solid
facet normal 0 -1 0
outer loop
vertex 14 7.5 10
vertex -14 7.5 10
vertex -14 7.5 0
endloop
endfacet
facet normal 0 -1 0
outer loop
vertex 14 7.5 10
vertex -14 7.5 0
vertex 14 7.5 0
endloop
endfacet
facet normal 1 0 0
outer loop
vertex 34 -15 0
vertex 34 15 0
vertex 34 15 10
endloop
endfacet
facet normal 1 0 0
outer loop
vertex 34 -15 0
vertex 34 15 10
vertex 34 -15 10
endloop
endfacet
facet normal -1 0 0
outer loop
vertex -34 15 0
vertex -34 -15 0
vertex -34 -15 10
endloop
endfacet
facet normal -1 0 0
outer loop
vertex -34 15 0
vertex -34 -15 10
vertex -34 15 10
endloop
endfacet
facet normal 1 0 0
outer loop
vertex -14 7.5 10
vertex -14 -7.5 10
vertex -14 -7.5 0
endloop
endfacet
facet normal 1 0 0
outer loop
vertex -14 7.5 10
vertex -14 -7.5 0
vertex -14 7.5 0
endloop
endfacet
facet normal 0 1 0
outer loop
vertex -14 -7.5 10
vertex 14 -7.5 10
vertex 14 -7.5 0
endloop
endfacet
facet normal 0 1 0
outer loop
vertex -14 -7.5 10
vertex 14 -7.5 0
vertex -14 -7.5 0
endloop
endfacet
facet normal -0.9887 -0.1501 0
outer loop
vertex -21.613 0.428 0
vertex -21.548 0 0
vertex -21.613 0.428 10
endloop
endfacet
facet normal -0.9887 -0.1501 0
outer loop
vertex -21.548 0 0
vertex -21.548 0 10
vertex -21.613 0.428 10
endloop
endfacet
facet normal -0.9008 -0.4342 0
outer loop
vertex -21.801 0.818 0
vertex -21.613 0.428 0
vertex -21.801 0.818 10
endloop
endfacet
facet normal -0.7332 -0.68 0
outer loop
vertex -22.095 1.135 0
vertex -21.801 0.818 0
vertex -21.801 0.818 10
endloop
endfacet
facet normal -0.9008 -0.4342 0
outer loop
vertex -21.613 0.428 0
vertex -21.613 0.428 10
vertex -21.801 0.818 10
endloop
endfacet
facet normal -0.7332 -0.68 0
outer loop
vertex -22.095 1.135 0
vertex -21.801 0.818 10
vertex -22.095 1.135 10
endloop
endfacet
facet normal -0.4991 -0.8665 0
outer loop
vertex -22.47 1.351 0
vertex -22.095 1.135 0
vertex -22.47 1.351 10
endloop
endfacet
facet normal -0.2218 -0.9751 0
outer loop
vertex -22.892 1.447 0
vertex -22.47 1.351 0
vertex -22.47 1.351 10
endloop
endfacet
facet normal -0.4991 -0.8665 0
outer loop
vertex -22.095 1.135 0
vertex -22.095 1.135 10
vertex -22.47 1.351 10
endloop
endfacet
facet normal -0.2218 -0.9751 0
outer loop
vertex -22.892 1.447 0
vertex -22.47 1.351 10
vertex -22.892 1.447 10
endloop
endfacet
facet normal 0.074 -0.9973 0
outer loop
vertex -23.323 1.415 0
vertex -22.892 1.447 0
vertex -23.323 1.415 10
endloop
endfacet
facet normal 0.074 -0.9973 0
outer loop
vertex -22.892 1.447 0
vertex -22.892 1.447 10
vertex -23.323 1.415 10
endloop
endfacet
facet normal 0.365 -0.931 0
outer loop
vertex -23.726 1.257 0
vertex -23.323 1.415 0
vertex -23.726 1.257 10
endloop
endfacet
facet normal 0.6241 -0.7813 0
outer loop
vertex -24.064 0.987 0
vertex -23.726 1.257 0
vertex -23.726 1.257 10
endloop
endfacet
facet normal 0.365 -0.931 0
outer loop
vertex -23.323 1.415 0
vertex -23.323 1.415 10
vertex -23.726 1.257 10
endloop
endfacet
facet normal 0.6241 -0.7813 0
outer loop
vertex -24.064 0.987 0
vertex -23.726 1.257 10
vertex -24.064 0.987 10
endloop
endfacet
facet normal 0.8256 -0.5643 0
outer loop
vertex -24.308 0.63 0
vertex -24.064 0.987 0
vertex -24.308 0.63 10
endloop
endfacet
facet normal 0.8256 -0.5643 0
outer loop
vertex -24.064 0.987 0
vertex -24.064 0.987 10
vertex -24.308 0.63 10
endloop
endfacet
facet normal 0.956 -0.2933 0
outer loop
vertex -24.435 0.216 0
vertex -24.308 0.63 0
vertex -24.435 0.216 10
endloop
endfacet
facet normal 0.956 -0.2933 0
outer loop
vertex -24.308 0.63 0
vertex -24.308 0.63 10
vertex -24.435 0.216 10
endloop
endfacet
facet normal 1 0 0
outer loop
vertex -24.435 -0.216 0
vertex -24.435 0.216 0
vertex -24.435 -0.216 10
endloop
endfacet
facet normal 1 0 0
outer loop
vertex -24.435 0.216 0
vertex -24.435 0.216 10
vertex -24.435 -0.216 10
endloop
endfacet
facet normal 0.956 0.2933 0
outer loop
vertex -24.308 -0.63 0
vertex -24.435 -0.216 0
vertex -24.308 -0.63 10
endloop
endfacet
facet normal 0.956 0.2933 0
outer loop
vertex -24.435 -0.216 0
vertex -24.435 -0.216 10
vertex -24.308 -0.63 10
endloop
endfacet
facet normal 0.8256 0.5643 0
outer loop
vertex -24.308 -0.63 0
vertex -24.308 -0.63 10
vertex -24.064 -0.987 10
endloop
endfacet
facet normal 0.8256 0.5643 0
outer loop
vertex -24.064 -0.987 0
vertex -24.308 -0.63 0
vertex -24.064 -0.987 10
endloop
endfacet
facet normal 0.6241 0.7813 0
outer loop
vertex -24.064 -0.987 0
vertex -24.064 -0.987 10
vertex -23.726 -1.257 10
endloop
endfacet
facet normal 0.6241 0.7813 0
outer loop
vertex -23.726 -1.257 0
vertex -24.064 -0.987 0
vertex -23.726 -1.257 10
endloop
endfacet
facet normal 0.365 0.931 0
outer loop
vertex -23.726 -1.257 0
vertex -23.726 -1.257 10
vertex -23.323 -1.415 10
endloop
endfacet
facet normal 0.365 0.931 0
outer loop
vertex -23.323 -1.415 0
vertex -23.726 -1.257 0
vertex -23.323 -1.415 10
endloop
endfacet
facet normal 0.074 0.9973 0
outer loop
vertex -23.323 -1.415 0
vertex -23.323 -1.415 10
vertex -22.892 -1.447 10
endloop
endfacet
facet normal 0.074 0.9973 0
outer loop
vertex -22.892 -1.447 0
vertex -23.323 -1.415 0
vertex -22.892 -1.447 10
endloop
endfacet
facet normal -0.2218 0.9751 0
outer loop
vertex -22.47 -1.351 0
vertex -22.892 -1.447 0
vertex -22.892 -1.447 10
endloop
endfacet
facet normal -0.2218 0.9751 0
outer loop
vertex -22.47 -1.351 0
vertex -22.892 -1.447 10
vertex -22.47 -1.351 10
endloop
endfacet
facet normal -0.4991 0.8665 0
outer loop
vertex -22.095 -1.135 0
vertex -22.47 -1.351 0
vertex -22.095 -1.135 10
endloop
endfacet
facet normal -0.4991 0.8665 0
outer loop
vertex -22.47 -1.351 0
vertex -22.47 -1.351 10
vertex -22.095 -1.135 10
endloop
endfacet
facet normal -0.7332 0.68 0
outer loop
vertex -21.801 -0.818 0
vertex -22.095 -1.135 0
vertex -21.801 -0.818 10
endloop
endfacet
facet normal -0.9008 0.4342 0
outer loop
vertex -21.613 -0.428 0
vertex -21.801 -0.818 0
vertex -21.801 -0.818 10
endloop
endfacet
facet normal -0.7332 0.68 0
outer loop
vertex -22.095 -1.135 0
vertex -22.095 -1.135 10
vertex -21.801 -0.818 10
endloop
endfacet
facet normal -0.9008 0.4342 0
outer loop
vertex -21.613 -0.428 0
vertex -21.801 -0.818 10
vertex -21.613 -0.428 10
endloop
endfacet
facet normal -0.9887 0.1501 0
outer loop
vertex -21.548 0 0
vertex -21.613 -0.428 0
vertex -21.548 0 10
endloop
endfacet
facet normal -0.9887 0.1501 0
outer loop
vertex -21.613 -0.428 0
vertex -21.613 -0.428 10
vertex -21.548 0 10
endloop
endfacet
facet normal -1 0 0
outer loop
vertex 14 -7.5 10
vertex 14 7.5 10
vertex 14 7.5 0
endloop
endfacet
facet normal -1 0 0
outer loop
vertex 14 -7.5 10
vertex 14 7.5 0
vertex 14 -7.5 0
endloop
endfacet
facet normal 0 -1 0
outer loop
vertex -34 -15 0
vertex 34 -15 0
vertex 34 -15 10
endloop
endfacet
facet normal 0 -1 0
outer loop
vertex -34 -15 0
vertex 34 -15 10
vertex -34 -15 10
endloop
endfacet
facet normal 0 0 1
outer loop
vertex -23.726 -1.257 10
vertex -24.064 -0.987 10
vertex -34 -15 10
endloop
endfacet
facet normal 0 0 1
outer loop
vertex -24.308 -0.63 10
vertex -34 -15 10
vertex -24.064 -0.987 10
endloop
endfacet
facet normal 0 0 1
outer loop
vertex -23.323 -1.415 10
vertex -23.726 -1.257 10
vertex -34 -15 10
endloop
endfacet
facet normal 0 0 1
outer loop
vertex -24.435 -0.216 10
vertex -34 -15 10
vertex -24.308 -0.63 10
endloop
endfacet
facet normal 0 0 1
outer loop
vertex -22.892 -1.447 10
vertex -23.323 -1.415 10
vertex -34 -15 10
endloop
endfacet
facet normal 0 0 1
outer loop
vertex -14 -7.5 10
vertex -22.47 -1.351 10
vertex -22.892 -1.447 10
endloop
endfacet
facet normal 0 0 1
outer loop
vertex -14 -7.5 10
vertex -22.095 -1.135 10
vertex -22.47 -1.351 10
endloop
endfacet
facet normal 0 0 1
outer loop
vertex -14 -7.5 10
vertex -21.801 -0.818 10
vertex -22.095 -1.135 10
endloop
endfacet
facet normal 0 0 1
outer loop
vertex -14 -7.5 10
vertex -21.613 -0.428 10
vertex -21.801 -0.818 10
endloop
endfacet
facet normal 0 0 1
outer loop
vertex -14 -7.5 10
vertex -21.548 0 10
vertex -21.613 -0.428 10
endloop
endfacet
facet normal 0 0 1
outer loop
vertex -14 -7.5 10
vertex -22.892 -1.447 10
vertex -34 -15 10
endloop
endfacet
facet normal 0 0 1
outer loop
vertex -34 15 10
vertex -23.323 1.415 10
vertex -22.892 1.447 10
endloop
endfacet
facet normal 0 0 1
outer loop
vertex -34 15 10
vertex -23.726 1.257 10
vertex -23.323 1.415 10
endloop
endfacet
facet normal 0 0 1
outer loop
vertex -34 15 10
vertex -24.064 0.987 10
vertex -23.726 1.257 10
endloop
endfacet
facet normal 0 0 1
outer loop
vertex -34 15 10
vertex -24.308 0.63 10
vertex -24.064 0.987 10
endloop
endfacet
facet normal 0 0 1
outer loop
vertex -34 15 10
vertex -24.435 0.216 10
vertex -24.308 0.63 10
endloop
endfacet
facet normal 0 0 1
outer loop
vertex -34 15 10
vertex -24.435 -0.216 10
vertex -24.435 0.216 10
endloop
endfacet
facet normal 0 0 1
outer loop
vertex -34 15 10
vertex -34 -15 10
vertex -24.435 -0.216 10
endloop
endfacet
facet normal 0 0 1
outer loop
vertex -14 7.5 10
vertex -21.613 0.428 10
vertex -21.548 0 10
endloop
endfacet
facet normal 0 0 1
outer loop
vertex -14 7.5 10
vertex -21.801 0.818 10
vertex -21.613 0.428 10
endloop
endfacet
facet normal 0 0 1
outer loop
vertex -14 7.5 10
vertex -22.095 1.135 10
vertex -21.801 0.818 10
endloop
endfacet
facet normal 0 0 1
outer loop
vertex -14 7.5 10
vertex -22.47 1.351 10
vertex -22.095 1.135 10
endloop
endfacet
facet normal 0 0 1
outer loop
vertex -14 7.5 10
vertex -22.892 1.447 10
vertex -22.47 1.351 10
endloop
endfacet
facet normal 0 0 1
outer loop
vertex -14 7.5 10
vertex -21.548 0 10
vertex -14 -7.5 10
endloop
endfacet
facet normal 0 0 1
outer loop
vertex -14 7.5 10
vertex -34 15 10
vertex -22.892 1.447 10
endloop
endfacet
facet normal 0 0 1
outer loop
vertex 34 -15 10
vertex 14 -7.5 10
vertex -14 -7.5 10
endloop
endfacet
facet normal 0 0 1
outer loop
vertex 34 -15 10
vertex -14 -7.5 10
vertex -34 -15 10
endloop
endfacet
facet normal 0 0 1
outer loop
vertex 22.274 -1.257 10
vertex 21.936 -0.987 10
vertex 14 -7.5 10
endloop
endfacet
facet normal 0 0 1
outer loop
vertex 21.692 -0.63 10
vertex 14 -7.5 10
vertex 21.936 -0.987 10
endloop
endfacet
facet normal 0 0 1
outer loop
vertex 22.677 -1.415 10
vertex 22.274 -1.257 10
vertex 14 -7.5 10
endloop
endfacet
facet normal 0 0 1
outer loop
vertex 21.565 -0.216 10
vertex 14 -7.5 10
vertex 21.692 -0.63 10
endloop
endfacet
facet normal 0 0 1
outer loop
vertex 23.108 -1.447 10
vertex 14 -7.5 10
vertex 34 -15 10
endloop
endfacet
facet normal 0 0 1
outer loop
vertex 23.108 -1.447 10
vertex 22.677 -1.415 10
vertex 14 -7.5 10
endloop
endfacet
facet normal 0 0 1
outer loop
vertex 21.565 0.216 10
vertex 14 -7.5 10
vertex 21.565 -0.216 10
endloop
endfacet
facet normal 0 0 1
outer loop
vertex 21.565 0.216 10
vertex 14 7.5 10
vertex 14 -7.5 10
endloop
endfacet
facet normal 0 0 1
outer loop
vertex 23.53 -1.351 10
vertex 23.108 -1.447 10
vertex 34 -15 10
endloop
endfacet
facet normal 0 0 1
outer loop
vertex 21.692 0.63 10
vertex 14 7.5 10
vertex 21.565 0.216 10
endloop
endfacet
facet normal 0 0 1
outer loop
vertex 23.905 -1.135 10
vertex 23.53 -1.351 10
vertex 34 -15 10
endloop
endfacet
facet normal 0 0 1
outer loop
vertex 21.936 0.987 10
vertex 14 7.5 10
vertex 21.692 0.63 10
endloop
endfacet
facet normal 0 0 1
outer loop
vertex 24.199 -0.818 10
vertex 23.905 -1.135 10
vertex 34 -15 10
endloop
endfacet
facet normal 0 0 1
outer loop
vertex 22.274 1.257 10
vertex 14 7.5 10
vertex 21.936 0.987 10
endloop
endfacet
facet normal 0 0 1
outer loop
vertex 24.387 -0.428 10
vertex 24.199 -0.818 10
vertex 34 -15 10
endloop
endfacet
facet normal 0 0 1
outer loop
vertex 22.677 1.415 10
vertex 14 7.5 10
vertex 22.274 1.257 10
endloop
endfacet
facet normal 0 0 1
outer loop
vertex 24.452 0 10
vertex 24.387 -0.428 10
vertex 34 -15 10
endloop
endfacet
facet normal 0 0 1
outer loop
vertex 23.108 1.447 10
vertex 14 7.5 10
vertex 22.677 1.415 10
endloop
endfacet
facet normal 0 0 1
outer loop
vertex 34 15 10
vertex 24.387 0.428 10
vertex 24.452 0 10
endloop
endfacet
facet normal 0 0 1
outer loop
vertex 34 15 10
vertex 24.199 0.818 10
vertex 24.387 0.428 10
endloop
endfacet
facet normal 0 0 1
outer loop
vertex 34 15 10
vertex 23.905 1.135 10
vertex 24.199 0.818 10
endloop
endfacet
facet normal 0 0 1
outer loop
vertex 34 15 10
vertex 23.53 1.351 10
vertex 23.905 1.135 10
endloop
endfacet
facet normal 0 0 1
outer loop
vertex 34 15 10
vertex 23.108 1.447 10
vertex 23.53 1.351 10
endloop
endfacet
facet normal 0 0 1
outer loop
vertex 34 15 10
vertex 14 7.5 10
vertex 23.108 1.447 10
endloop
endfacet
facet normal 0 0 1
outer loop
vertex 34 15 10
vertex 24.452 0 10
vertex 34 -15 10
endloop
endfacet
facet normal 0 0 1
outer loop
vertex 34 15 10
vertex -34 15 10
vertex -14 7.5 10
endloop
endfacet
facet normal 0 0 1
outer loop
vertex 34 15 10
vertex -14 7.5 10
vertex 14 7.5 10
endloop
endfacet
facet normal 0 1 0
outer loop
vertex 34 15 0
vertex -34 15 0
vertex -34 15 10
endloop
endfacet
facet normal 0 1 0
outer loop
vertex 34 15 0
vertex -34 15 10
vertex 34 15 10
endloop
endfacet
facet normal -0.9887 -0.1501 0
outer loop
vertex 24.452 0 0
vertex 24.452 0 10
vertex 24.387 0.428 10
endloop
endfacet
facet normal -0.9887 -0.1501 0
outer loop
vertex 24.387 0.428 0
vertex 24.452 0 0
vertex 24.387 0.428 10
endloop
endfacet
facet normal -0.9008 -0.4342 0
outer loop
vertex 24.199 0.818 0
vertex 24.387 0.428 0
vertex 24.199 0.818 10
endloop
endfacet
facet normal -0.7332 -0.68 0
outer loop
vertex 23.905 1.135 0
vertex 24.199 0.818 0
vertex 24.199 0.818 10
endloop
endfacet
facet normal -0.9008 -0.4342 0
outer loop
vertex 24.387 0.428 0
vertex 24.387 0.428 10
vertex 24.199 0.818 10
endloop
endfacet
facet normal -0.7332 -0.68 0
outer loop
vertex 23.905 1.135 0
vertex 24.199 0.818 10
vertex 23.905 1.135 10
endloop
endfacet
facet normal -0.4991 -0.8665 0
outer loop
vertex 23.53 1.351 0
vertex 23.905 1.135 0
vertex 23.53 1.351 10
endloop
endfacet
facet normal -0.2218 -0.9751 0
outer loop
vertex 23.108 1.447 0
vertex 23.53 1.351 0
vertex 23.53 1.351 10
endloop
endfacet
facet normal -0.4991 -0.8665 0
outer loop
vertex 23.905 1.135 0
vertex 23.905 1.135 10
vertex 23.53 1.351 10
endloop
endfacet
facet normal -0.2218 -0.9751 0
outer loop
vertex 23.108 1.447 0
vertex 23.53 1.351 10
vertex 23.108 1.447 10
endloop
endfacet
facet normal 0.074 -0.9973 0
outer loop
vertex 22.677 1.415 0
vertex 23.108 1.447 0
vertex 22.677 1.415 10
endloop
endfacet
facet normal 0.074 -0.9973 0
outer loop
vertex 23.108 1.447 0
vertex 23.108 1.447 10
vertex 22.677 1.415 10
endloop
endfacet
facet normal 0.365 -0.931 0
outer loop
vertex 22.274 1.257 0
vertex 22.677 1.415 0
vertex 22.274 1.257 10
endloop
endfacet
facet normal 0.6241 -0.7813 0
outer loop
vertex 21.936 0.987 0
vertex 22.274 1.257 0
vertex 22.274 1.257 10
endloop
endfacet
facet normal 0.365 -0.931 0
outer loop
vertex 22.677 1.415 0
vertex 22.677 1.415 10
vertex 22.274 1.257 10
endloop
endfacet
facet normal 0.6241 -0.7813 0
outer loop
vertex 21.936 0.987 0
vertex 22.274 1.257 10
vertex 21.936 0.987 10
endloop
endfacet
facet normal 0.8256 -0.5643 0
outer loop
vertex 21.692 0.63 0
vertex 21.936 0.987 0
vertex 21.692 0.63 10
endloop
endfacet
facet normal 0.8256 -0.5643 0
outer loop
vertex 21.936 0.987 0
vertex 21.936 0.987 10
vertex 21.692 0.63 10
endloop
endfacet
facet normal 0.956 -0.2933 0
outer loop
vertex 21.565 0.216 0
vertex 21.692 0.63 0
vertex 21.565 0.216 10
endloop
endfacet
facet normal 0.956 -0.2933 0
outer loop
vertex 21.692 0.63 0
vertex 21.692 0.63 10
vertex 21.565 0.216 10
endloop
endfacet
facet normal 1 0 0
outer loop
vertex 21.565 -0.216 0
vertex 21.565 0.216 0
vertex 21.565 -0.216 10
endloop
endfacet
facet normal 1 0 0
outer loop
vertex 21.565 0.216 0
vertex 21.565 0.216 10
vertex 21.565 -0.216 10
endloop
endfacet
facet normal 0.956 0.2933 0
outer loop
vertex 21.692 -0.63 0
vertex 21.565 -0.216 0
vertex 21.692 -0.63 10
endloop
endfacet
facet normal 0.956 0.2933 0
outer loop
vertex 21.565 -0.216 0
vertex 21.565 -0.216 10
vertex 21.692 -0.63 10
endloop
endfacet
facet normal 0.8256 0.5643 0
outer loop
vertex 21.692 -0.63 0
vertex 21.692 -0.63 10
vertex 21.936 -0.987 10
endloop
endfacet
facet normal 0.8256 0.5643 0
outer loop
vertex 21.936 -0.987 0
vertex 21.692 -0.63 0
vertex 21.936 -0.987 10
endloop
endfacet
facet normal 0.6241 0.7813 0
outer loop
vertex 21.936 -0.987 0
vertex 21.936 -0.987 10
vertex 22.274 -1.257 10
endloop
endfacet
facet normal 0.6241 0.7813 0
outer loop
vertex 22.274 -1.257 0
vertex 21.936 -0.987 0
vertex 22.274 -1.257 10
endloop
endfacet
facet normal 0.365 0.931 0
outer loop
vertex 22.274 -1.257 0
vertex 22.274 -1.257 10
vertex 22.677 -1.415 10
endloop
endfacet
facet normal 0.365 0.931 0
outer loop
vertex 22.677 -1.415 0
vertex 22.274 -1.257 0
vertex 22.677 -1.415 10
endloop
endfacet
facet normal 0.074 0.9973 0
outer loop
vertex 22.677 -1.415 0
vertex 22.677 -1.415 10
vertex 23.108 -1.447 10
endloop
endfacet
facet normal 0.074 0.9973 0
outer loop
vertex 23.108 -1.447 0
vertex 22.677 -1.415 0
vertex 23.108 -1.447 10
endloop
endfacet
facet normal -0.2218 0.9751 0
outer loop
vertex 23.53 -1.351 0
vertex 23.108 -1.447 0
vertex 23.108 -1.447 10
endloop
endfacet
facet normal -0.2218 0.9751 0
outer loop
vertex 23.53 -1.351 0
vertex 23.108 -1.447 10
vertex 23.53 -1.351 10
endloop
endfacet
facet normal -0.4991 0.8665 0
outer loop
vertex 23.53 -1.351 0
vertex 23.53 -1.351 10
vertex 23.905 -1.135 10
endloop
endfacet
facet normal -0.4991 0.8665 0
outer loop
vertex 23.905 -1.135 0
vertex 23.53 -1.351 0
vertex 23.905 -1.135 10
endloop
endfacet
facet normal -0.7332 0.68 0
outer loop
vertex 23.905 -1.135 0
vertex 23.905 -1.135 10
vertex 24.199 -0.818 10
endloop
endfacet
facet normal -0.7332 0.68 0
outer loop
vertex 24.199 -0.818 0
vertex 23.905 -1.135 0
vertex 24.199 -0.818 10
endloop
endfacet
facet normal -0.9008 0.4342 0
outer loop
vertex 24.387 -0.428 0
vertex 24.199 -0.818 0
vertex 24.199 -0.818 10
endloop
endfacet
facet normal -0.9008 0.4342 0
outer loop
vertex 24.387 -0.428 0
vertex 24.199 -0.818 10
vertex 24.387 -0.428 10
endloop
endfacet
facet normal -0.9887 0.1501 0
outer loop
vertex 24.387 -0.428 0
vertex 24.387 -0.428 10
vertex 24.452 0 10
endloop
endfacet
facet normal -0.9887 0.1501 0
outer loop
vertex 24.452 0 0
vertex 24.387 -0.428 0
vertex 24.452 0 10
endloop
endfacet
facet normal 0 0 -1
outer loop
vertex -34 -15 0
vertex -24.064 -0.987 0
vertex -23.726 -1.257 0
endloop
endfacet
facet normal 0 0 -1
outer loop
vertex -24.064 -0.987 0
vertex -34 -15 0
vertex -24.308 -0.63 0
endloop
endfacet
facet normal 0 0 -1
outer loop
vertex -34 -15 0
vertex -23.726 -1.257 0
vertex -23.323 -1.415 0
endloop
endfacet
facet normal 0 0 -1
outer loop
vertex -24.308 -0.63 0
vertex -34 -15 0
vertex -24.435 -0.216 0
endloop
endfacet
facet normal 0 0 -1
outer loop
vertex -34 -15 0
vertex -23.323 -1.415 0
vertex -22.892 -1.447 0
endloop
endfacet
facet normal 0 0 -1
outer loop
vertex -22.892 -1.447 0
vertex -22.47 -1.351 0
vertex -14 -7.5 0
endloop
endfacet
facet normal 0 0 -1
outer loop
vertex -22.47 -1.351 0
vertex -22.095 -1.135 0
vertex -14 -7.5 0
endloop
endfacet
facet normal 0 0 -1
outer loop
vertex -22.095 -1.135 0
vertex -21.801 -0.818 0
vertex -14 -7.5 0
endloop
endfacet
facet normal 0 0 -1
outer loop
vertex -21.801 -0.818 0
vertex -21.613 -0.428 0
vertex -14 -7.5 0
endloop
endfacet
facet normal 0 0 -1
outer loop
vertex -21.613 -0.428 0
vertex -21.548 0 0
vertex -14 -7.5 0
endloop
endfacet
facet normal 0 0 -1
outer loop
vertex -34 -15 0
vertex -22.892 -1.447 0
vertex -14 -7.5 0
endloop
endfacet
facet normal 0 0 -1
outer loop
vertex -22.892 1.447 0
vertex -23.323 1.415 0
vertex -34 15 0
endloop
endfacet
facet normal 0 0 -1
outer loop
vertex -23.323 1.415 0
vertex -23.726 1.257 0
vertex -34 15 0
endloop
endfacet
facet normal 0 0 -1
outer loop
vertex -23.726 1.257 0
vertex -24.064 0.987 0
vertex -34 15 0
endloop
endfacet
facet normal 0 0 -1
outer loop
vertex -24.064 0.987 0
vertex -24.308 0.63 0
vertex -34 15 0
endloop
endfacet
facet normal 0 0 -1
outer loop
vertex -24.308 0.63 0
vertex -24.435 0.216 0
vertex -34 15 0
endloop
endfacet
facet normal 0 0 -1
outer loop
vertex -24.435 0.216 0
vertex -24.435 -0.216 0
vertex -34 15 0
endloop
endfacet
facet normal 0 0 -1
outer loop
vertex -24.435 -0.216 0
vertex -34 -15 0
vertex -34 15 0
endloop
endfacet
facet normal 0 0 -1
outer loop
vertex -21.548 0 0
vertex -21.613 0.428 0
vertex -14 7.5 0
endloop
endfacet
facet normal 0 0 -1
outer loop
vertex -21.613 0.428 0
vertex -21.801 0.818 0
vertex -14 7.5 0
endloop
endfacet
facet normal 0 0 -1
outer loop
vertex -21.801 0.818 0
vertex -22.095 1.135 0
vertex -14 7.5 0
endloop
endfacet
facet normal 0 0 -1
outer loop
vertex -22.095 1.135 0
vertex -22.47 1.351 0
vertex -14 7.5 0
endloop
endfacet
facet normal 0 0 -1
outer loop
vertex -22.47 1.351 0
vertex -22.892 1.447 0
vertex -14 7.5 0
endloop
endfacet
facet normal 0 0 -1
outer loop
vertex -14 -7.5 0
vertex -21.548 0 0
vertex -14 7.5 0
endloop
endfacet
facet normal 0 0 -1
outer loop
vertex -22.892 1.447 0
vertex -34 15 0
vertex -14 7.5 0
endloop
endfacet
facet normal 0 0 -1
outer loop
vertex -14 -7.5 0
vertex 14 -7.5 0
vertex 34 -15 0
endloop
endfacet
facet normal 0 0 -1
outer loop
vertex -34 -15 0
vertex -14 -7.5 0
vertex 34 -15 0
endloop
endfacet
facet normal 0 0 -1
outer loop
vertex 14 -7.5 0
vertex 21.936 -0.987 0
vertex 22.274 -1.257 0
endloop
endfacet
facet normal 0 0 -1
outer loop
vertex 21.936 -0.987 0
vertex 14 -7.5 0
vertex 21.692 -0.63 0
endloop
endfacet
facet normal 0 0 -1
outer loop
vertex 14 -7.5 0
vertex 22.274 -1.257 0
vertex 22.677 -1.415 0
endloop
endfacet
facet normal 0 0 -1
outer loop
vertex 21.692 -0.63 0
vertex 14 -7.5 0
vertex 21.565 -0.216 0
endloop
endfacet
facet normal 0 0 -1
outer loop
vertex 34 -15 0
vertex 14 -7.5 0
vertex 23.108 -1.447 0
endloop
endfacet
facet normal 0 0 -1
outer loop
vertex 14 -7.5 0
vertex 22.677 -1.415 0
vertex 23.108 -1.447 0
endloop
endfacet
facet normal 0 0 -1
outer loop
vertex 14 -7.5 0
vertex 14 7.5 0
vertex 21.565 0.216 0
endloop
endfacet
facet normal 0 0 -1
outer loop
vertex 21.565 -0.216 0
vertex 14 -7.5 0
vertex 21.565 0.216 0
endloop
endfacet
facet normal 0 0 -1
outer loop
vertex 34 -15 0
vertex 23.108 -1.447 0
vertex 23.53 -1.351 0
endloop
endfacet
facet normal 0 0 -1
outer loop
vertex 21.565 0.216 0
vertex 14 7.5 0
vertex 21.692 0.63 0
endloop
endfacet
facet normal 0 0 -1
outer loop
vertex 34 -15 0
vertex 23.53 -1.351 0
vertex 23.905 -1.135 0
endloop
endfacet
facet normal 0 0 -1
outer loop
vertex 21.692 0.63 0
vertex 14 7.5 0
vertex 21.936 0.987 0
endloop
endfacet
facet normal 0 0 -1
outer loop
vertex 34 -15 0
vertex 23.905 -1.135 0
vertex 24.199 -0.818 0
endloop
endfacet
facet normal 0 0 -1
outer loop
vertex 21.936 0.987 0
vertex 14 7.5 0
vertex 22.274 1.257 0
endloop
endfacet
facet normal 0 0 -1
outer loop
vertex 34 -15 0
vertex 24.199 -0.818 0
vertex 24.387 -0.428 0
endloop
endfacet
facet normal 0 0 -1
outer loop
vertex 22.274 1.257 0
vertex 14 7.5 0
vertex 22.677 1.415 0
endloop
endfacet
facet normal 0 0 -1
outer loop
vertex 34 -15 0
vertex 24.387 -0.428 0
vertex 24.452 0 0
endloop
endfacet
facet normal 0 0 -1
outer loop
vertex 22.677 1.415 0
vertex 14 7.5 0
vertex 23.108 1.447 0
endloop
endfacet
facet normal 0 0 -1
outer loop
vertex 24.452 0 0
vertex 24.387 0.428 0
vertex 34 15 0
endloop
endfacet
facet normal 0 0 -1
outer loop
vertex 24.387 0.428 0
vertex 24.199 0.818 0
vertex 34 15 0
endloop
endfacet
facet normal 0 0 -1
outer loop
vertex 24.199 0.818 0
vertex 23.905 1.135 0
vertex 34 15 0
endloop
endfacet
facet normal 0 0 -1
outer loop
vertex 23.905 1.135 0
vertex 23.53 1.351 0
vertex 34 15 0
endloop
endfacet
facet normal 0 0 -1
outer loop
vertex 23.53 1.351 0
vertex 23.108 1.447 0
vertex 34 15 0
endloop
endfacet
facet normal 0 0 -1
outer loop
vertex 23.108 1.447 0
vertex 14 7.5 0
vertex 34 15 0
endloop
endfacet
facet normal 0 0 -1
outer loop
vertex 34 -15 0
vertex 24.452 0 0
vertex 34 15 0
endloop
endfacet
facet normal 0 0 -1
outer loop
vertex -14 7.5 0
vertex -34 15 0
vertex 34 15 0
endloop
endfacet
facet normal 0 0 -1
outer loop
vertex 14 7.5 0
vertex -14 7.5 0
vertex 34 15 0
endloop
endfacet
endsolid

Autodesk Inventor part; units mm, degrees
ref_plane "YZ Plane" through (0, 0, 0) normal (1, 0, 0) x (0, 1, 0)
ref_plane "XZ Plane" through (0, 0, 0) normal (0, 1, 0) x (-1, 0, 0)
ref_plane "XY Plane" through (0, 0, 0) normal (0, 0, 1) x (1, 0, 0)
sketch "Sketch1" plane through (0, 0, 0) normal (0, 0, 1) x (1, 0, 0)
  line L0 (-34, 15) -> (34, 15)
  line L1 (34, 15) -> (34, -15)
  line L2 (34, -15) -> (-34, -15)
  line L3 (-34, -15) -> (-34, 15)
  line L4 (-34, 15) -> (34, -15) construction
  line L5 (34, 15) -> (-34, -15) construction
  point P0 (0, 0)
  dimension "d0" = 68
  dimension "d1" = 30
extrude "Extrusion1" add sketch "Sketch1" along normal blind 10
sketch "Sketch2" plane through (0, 0, 10) normal (0, 0, 1) x (1, 0, 0)
  line L0 (-14, 7.5) -> (14, 7.5)
  line L1 (14, 7.5) -> (14, -7.5)
  line L2 (14, -7.5) -> (-14, -7.5)
  line L3 (-14, -7.5) -> (-14, 7.5)
  line L4 (-14, 7.5) -> (14, -7.5) construction
  line L5 (14, 7.5) -> (-14, -7.5) construction
  point P0 (0, 0)
  dimension "d4" = 28
  dimension "d5" = 15
extrude "Extrusion2" cut sketch "Sketch2" against normal blind 10
sketch "Sketch3" plane through (0, 0, 10) normal (0, 0, 1) x (1, 0, 0)
  circle A0 centre (-23, 0) radius 1.4515
  circle A1 centre (23, 0) radius 1.4515
  line L0 (-14, -7.5) -> (-14, 7.5) projected
  line L1 (14, 7.5) -> (14, -7.5) projected
  point P0 (0, 0)
  dimension "d8" = 2.903
  dimension "d9" = 2.903
  dimension "d10" = 9
  dimension "d11" = 9
extrude "Extrusion3" cut sketch "Sketch3" against normal blind 10
properties part number "1st arm closing"
